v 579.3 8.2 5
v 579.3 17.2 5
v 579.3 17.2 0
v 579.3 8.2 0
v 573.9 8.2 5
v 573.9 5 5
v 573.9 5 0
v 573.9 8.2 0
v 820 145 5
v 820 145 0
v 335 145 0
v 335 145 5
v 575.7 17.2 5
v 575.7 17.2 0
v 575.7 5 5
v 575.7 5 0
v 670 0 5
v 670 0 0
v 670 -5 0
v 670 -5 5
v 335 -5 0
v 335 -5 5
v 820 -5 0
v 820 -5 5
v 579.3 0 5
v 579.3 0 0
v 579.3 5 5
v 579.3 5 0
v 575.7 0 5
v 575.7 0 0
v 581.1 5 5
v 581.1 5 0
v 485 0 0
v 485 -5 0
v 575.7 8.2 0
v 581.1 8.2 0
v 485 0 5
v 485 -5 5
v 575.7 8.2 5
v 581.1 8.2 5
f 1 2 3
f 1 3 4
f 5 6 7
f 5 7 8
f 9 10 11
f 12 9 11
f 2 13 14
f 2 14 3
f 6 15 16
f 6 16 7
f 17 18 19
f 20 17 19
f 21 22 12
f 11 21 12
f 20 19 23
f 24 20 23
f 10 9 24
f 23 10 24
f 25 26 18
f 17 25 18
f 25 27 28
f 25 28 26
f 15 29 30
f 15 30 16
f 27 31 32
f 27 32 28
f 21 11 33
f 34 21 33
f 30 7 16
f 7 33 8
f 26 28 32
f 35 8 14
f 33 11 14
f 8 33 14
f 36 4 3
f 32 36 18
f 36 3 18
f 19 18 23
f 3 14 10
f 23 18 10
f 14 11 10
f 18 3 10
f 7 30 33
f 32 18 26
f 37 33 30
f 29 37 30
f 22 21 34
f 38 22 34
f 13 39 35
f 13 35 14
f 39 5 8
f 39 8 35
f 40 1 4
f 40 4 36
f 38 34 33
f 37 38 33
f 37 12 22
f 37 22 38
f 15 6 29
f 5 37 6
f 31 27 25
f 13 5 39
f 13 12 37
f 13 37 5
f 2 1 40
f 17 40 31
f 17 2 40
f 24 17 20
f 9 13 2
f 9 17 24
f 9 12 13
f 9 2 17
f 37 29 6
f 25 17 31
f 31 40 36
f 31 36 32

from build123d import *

# Parameters (mm, degrees)
SALIENTE_EXTRUIR1_DEPTH = 5
CROQUIS2_W              = 5
CROQUIS2_H              = 35
CORTAR_EXTRUIR1_DEPTH   = 5
CORTAR_EXTRUIR2_DEPTH   = 10
CORTAR_EXTRUIR3_DEPTH   = 10


with BuildPart() as part:
    # Croquis1 → Saliente-Extruir1 (new body)
    with BuildSketch(Plane.XY):
        Polygon((0, 145), (0, 0), (183.734642654, 0), (185, 0), (185, -5), (485, -5), (485, 0), (670, 0), (670, -5), (970, -5), (970, 0), (1155, 0), (1155, -5), (1455, -5), (1455, 0), (1640, 0), (1640, 145), align=None)
    extrude(amount=SALIENTE_EXTRUIR1_DEPTH)

    # Croquis2 → Cortar-Extruir1 (cut)
    with BuildSketch(Plane.XY.offset(5)):
        with Locations((1637.5, 108.75)):
            Rectangle(CROQUIS2_W, CROQUIS2_H)
        with Locations((1637.5, 36.25)):
            Rectangle(CROQUIS2_W, CROQUIS2_H)
        with Locations((2.5, 36.25)):
            Rectangle(CROQUIS2_W, CROQUIS2_H)
        with Locations((2.5, 108.75)):
            Rectangle(CROQUIS2_W, CROQUIS2_H)
    extrude(amount=-CORTAR_EXTRUIR1_DEPTH, mode=Mode.SUBTRACT)

    # Croquis3 → Cortar-Extruir2 (cut)
    with BuildSketch(Plane.XY.offset(5)):
        Polygon((579.3, 0), (575.7, 0), (575.7, 5), (573.9, 5), (573.9, 8.2), (575.7, 8.2), (575.7, 17.2), (579.3, 17.2), (579.3, 8.2), (581.1, 8.2), (581.1, 5), (579.3, 5), align=None)
        Polygon((1064.3, 8.2), (1064.3, 17.2), (1060.7, 17.2), (1060.7, 8.2), (1058.9, 8.2), (1058.9, 5), (1060.7, 5), (1060.7, 0), (1064.3, 0), (1064.3, 5), (1066.1, 5), (1066.1, 8.2), align=None)
    extrude(amount=-CORTAR_EXTRUIR2_DEPTH, mode=Mode.SUBTRACT)

    # Croquis4 → Cortar-Extruir3 (cut)
    with BuildSketch(Plane.XY.offset(5)):
        Polygon((820, -135.215134583), (820, -5), (820, 145), (1680.90531261, 145), (1680.90531261, -135.215134583), align=None)
        Polygon((-54.126179429, 245.627194546), (335, 145), (335, -5), (335, -117.531617176), (-54.126179429, -117.531617176), align=None)
    extrude(amount=-CORTAR_EXTRUIR3_DEPTH, mode=Mode.SUBTRACT)


solid = part.part
